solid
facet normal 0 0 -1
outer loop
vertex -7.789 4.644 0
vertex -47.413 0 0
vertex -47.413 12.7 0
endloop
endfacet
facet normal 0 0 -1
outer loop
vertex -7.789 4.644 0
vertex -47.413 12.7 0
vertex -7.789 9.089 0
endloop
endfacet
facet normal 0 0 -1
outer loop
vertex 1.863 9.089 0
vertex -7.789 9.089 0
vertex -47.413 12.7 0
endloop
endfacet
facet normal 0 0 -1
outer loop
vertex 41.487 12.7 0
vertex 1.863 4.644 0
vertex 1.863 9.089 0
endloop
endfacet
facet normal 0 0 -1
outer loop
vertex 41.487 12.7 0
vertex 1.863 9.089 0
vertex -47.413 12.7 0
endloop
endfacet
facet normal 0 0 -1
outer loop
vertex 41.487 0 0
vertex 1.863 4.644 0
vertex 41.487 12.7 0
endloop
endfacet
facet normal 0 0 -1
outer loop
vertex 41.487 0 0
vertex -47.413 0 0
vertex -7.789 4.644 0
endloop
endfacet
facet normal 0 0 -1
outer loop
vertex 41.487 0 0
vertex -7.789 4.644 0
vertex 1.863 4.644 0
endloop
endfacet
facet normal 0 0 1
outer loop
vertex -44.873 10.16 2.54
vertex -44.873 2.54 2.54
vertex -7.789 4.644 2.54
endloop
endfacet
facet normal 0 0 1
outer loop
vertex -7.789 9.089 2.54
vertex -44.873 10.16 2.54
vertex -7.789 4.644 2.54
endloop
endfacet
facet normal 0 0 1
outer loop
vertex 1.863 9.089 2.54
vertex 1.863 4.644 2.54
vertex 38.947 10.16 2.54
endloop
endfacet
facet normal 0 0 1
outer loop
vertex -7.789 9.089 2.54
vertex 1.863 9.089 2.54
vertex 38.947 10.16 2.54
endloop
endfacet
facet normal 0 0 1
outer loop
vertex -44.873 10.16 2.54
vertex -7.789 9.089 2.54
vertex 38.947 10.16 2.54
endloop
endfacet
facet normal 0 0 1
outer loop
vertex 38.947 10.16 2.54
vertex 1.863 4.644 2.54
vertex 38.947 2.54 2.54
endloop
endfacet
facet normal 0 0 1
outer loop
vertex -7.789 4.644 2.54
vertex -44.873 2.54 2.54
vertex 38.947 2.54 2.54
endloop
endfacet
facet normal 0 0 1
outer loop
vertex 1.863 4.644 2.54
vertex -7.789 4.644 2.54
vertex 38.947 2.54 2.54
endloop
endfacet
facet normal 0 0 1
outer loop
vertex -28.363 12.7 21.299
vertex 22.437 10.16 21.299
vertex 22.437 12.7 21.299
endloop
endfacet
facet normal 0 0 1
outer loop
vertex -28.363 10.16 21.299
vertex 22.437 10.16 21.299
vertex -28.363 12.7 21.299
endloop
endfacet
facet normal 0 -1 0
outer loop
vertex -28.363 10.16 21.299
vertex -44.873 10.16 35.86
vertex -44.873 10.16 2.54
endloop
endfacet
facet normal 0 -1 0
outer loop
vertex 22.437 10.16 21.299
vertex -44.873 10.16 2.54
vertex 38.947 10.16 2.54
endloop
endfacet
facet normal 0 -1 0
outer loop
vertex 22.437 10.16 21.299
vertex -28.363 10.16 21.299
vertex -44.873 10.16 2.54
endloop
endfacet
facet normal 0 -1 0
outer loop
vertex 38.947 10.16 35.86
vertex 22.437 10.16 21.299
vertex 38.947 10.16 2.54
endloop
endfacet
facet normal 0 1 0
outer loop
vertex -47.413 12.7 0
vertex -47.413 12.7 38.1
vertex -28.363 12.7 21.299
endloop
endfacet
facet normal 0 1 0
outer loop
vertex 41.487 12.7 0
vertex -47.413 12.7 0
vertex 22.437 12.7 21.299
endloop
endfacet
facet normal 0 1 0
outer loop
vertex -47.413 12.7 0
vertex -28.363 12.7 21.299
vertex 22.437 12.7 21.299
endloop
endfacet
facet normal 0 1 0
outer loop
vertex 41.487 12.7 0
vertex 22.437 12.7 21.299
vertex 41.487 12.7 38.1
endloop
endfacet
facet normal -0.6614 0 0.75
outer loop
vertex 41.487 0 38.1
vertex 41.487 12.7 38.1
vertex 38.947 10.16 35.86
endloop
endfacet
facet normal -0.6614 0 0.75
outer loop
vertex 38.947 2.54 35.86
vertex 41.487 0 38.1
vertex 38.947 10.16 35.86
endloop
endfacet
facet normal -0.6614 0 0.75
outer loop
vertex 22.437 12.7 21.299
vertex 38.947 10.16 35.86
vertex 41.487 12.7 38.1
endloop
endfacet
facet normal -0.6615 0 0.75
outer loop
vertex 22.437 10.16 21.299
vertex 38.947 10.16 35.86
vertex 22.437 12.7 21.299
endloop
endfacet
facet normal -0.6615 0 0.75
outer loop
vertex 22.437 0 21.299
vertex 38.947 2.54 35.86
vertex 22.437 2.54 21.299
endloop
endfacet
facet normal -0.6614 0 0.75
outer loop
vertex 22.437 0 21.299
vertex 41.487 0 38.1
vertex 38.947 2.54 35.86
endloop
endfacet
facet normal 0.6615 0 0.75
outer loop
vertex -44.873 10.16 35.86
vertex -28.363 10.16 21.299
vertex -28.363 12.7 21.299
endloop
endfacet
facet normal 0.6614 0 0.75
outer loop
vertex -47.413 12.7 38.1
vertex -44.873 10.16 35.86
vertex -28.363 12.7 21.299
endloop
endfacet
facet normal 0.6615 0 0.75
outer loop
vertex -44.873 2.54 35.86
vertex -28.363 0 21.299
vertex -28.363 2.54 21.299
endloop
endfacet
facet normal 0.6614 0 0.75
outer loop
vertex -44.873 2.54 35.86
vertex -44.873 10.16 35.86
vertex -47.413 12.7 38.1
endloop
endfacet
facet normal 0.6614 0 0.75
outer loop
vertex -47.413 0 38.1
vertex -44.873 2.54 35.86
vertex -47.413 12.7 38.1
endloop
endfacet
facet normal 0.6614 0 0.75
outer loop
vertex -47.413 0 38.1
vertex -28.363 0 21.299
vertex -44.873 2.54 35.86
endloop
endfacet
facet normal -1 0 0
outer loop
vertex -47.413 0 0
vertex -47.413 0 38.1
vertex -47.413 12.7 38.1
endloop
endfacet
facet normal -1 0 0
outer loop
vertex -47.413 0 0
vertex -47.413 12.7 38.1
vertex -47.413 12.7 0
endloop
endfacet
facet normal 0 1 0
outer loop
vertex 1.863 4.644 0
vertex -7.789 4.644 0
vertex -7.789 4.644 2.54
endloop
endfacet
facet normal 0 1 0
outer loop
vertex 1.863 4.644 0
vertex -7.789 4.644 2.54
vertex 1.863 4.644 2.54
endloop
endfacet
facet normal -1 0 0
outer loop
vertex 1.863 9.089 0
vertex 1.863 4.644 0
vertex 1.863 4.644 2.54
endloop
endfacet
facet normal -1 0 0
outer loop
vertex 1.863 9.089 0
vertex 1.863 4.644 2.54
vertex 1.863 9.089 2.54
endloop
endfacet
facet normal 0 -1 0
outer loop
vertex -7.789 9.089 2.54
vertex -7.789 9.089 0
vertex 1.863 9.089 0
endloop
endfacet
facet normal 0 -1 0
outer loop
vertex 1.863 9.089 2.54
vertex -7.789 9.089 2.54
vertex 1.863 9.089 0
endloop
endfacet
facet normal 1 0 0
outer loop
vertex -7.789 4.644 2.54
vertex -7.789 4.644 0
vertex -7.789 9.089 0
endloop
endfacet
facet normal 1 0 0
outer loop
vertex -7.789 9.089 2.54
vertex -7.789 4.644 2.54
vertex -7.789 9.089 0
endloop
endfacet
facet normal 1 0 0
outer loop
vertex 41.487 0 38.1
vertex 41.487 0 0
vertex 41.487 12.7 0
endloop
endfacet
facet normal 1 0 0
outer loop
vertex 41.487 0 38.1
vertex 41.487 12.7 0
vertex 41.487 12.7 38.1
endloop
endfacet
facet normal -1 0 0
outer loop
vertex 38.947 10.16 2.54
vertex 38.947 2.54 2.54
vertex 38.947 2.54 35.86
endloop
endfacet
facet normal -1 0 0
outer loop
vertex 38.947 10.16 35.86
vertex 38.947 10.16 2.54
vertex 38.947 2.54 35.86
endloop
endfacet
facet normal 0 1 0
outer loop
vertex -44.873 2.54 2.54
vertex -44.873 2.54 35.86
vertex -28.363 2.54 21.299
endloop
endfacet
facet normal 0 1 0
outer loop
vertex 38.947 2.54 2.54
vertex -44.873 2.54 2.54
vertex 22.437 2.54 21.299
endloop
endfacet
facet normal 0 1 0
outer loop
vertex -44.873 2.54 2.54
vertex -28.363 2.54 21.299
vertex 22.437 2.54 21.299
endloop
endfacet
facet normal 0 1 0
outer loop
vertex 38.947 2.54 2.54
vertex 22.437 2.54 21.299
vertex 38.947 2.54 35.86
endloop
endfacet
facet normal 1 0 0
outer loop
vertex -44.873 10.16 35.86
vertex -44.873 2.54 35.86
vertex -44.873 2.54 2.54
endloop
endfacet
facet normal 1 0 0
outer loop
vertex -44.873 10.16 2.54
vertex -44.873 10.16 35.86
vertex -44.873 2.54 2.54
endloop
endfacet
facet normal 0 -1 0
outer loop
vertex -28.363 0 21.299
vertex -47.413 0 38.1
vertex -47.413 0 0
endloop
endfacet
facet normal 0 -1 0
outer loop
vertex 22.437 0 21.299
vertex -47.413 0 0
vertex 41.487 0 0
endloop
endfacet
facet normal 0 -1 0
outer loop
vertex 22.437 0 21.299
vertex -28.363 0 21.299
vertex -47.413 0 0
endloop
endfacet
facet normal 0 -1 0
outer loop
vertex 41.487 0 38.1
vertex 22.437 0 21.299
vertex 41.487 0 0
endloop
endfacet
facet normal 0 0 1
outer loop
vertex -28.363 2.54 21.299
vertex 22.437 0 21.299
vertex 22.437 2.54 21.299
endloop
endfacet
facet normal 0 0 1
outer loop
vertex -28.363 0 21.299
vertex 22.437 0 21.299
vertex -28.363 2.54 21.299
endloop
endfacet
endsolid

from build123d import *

# Parameters (mm, degrees)
F1_DEPTH = 12.7
F2_T     = -2.54
F3_W     = 9.652
F3_H     = 4.445
F4_DEPTH = 25.4


with BuildPart() as f1:
    # F0 (on Front) → F1 (new body)
    with BuildSketch(Plane.XZ):
        Polygon((-47.413333, 38.1), (-47.413333, 0), (41.486667, 0), (41.486667, 38.1), (22.436667, 21.299479), (-28.363333, 21.299479), align=None)
    extrude(amount=-F1_DEPTH)

    # F2
    f2_openings = [f1.faces().sort_by_distance(p)[0] for p in [
        (-2.963333, 6.35, 21.299479),
        (-37.888333, 6.35, 29.69974),
        (31.961667, 6.35, 29.69974),
    ]]
    offset(amount=F2_T, openings=f2_openings)

    # F3 (on Top) → F4 (cut)
    with BuildSketch(Plane.XY):
        with Locations((-2.963333, 6.866706)):
            Rectangle(F3_W, F3_H)
    extrude(amount=F4_DEPTH, mode=Mode.SUBTRACT)


solid = f1.part
